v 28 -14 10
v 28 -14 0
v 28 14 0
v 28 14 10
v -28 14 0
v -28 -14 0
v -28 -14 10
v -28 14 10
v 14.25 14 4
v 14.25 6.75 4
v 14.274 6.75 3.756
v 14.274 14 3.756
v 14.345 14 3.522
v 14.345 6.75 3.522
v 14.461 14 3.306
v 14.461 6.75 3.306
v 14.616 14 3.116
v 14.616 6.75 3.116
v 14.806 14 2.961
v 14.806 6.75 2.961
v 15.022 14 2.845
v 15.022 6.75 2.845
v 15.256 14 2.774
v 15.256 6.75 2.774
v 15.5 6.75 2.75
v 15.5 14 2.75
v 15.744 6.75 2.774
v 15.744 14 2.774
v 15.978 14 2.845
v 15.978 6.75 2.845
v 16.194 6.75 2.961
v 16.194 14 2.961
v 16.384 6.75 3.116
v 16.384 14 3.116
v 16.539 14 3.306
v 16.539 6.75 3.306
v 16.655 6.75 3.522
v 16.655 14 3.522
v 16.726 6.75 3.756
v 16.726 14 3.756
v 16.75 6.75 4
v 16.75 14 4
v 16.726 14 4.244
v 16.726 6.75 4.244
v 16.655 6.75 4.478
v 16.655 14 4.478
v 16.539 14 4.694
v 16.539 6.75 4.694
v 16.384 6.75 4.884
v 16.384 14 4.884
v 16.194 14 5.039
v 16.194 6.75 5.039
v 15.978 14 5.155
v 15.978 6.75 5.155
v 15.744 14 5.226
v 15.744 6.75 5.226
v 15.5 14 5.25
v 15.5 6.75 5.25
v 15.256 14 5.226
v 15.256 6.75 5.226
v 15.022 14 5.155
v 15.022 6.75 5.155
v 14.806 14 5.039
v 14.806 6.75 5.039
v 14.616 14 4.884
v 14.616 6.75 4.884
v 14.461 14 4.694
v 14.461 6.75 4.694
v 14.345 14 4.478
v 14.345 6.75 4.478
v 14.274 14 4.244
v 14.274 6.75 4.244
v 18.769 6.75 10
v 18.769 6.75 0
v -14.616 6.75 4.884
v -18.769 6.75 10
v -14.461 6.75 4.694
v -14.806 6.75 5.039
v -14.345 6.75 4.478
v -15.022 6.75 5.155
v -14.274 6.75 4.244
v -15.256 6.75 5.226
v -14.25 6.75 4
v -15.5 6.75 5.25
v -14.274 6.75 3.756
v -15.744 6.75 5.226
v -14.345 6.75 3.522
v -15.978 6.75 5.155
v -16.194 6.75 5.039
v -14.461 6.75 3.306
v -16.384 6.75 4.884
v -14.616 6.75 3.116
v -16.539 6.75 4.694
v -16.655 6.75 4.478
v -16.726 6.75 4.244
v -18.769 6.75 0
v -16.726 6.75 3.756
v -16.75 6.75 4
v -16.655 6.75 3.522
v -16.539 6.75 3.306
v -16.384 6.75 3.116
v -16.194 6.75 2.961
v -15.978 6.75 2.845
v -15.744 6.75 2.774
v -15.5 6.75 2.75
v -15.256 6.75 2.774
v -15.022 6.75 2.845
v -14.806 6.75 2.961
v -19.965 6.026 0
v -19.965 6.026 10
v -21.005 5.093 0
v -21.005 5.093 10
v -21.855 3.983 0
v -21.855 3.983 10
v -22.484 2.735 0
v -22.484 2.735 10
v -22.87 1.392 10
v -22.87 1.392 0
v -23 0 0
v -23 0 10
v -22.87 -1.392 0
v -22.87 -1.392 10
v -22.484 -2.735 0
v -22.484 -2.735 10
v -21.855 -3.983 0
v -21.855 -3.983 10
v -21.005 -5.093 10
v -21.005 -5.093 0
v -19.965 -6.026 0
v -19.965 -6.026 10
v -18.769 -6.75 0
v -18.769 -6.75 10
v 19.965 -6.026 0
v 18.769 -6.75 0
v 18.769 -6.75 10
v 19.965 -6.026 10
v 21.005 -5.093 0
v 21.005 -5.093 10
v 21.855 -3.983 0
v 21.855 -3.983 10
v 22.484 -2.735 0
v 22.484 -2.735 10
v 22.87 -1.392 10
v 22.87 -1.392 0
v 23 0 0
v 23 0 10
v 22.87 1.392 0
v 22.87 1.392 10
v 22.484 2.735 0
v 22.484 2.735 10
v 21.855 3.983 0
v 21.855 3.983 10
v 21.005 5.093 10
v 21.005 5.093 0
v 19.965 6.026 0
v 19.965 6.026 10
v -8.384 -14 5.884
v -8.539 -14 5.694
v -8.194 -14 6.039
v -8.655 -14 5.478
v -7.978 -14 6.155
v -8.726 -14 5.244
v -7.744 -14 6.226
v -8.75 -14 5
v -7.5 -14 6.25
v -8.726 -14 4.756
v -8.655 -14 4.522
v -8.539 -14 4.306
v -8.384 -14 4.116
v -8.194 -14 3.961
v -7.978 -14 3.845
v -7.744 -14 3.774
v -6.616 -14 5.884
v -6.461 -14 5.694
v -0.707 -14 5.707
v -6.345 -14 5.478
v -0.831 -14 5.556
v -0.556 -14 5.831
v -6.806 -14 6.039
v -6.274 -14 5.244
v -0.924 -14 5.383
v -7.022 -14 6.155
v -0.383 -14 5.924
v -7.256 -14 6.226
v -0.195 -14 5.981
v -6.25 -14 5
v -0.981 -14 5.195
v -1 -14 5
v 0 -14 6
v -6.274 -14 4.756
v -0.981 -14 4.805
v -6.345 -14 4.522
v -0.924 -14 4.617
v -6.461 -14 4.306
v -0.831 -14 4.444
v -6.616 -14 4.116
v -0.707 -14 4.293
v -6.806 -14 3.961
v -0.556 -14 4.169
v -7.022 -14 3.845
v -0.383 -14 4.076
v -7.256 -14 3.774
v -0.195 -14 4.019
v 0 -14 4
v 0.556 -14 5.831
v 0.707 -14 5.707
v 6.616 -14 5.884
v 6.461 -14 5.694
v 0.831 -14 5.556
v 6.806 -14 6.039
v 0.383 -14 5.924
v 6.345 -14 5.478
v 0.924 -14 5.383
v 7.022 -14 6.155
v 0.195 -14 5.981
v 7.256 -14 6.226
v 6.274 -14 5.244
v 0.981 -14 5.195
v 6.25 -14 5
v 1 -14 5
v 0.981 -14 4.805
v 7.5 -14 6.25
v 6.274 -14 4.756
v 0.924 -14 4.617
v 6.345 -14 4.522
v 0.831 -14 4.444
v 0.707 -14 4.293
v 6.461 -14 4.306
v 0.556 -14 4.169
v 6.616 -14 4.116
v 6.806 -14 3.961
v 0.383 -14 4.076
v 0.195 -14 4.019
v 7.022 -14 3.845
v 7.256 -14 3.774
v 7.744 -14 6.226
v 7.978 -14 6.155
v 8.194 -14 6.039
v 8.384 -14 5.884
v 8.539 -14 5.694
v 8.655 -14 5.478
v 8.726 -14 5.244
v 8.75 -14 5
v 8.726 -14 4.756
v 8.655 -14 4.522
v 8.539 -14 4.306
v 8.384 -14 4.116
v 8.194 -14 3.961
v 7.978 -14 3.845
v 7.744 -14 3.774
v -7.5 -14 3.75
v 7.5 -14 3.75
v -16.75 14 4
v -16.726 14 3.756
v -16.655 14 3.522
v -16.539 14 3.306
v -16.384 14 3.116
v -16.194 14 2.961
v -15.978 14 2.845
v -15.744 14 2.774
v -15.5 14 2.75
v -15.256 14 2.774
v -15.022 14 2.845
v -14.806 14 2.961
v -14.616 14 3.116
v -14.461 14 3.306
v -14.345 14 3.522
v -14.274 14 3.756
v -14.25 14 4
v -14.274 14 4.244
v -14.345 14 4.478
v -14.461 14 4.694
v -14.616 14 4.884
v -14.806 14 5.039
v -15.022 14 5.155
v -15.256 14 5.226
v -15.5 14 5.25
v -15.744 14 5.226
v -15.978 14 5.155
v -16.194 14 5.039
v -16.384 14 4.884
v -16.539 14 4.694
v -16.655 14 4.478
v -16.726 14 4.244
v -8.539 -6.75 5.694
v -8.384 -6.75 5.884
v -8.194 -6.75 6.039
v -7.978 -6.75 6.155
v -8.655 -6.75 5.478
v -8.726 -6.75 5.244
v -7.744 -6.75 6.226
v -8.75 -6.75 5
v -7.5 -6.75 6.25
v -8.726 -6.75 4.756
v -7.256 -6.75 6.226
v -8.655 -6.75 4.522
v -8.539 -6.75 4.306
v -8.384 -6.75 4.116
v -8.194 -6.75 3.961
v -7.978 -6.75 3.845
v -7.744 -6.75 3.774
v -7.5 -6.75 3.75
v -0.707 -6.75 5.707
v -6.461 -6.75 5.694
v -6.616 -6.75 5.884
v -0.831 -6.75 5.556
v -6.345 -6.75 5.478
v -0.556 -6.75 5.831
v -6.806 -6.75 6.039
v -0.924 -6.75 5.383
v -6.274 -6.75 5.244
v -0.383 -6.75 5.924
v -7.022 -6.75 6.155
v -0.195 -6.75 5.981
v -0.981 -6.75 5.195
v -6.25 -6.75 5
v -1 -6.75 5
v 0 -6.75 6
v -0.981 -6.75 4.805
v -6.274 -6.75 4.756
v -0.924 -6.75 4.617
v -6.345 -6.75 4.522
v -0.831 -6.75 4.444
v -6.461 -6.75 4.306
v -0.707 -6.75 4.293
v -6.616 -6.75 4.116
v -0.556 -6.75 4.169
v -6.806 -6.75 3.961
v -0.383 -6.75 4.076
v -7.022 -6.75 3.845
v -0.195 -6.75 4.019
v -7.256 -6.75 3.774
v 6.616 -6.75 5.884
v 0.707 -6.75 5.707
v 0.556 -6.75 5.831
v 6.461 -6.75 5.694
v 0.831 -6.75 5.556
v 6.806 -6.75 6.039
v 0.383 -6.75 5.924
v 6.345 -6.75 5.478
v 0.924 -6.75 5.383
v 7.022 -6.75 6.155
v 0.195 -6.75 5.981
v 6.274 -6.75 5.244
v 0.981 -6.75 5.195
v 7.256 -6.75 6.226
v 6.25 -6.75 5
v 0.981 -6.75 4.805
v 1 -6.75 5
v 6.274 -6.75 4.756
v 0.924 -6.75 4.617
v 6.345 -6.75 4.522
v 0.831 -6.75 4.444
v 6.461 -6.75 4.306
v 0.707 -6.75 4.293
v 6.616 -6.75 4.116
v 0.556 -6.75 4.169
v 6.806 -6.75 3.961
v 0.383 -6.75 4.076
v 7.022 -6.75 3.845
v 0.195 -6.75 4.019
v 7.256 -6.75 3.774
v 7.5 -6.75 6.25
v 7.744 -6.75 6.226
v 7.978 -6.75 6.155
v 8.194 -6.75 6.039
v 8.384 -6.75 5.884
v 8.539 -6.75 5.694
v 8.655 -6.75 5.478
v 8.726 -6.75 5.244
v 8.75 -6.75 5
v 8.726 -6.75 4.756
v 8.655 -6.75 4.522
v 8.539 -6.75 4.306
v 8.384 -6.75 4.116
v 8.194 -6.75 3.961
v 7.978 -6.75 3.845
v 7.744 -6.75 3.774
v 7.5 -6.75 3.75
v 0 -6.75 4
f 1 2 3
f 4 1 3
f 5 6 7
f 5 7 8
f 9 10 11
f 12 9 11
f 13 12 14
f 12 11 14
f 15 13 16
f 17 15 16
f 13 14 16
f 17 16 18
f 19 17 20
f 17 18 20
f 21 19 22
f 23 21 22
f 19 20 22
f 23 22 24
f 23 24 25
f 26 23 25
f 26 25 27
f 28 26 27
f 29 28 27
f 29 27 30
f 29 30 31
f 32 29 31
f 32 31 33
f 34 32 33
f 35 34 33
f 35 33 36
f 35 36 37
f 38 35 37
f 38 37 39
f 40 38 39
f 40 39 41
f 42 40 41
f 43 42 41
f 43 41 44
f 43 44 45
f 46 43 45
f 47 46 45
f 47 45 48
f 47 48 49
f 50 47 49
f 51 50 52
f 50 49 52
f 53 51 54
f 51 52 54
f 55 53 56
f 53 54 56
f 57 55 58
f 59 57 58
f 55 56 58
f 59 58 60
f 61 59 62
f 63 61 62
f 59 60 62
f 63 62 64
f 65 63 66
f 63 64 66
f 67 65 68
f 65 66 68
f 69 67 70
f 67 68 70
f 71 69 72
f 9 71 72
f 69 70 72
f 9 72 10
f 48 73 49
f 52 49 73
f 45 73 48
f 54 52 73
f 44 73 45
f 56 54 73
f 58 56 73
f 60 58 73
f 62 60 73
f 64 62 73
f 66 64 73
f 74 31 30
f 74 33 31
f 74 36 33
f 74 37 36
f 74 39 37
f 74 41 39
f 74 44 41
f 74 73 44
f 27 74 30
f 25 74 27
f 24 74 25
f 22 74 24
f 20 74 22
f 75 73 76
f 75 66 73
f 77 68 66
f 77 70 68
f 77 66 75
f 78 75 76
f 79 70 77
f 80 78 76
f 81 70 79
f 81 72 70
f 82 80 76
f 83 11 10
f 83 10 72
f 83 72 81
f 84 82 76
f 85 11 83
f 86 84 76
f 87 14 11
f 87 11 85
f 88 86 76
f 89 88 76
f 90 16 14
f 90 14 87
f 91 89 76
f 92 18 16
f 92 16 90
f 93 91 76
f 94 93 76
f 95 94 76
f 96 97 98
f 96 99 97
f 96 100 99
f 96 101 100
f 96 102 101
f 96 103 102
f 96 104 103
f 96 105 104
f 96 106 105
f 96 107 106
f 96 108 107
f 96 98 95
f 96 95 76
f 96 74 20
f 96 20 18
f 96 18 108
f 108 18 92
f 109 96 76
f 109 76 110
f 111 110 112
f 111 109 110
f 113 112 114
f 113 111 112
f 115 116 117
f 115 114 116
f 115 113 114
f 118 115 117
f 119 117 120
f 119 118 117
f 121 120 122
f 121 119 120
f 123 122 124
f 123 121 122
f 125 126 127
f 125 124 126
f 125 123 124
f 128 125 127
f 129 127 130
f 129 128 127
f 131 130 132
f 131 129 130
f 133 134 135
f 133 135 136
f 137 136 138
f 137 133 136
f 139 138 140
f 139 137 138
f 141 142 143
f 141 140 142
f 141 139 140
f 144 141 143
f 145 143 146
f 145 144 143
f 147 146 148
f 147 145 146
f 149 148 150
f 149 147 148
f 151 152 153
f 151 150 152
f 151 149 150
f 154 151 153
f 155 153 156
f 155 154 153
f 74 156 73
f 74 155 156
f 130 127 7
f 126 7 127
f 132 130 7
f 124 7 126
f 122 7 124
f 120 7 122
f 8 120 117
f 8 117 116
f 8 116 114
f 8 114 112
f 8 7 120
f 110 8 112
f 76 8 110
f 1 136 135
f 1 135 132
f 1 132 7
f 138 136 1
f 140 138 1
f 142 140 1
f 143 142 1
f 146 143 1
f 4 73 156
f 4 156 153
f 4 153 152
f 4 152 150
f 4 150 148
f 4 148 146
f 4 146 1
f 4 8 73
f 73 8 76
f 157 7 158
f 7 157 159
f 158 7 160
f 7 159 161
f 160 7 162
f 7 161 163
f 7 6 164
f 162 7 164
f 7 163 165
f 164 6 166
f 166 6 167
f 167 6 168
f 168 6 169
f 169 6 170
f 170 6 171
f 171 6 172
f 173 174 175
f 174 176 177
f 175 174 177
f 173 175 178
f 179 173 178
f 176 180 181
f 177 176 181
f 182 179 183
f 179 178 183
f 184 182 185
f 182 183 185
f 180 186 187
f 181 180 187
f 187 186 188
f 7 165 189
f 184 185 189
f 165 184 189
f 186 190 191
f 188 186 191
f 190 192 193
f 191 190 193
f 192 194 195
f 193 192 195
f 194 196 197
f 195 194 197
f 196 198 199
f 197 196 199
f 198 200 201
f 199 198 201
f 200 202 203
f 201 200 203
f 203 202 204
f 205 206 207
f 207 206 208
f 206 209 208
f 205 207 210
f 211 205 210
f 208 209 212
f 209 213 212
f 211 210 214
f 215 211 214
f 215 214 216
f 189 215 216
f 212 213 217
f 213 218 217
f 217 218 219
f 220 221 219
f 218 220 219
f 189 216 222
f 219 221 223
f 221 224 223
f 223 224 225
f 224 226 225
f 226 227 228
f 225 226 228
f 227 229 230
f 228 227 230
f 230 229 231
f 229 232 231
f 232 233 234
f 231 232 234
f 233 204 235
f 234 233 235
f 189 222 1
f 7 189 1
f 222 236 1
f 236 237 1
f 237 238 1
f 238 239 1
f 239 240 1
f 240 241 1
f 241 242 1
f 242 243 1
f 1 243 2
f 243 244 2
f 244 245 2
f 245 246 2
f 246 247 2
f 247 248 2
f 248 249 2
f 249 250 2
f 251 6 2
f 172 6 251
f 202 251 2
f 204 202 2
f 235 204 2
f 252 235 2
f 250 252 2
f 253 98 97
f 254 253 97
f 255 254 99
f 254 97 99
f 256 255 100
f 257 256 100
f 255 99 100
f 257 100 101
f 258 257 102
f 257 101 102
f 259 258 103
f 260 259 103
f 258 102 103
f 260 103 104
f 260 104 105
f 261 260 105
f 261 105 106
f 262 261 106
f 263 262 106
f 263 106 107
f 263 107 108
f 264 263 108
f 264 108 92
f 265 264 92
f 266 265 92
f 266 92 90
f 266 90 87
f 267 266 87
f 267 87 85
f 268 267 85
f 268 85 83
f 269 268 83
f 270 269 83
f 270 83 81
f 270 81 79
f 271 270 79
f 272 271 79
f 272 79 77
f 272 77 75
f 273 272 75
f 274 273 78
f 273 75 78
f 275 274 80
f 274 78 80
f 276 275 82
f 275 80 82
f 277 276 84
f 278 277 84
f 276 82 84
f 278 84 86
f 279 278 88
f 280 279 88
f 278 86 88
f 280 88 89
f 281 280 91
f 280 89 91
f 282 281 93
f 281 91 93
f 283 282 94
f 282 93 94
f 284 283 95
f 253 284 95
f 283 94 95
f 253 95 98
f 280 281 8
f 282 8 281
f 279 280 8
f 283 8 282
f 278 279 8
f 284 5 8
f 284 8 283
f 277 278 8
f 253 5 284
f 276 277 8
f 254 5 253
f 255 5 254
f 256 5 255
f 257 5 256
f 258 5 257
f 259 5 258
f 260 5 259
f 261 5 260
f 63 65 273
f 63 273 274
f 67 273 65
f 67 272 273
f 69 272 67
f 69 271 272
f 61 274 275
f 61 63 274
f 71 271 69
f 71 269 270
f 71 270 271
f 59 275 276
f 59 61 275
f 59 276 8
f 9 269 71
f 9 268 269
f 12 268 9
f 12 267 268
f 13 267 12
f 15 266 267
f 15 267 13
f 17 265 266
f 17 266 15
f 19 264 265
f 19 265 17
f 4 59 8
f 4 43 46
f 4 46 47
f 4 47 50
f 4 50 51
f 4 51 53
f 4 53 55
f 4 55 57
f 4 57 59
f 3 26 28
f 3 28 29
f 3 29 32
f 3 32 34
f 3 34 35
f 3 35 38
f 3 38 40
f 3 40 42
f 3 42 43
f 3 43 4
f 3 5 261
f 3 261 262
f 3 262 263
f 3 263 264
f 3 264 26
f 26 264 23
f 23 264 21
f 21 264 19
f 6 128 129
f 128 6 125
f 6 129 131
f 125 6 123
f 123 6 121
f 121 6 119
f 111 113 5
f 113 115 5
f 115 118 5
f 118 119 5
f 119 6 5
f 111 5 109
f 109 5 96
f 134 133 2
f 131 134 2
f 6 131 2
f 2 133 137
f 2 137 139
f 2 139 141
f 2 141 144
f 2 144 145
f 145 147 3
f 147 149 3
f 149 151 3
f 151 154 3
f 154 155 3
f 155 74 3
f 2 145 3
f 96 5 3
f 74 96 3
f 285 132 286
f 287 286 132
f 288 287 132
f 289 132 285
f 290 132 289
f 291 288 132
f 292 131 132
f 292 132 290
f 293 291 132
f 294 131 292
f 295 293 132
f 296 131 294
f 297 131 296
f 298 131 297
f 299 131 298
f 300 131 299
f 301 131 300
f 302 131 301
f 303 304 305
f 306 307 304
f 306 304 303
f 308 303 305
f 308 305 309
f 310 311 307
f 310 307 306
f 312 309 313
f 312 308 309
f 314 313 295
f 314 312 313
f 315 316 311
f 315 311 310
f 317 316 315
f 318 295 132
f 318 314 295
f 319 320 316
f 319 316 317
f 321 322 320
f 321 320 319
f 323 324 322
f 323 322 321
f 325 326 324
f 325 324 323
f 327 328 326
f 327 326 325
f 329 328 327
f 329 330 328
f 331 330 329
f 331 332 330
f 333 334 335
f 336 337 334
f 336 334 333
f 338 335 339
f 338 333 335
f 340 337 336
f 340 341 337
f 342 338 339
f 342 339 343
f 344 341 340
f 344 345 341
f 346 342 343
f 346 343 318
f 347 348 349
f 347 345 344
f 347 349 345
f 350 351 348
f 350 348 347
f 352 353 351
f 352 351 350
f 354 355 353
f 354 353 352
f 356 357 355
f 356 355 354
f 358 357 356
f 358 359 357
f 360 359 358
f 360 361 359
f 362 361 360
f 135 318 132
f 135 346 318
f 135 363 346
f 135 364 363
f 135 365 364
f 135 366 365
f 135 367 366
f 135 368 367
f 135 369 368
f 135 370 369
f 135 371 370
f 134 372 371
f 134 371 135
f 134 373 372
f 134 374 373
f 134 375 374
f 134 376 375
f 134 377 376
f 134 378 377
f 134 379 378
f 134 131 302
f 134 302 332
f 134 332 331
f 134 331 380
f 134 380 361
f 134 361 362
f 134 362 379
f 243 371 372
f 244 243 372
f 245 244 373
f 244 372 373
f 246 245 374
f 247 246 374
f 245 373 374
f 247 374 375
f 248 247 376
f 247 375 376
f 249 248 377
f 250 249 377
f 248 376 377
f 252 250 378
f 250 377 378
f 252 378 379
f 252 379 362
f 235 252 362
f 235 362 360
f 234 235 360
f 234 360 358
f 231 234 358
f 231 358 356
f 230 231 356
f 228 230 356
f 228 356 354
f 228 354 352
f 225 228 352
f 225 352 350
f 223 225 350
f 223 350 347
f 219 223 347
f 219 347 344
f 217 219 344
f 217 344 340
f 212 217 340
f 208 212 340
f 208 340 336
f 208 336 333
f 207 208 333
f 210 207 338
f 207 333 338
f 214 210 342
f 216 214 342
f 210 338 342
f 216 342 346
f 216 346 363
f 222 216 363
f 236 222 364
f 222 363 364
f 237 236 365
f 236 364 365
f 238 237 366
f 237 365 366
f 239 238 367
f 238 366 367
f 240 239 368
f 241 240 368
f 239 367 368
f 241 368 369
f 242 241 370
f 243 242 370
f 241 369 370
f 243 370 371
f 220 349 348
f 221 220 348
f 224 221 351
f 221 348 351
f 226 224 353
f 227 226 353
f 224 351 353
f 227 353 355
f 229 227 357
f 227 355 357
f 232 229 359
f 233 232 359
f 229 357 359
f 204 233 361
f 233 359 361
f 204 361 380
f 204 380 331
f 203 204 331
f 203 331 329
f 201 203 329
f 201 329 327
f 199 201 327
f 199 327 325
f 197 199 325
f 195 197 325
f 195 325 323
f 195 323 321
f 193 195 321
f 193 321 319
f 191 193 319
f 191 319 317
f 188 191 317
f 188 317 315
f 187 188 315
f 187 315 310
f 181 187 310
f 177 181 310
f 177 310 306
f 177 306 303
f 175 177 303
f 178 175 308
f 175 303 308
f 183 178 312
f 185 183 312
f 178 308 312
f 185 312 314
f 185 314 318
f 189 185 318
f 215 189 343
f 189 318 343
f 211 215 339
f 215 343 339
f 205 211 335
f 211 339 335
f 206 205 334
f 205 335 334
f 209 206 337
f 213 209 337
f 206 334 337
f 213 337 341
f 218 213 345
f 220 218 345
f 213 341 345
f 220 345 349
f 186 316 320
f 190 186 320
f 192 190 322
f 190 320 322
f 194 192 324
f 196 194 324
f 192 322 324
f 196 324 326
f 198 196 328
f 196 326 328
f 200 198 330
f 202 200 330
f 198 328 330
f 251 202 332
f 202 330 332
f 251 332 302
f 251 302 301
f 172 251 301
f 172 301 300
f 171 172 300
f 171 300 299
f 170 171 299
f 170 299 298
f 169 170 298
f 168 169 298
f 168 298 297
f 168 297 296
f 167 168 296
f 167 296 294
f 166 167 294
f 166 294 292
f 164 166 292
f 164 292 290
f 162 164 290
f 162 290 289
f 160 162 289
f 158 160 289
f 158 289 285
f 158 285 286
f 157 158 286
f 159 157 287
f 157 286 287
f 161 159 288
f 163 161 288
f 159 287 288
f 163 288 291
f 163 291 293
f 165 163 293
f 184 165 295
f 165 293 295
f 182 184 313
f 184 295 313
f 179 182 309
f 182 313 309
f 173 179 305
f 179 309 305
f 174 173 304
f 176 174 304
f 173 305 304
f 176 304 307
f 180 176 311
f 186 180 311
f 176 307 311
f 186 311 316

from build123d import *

# Parameters (mm, degrees)
SKIZZE1_W                       = 56
SKIZZE1_H                       = 28
AUFSATZ_LINEAR_AUSTRAGEN1_DEPTH = 10
SCHNITT_LINEAR_AUSTRAGEN1_DEPTH = 33.86335345
KERNLOCH_F_R_M3_GEWINDE1_D      = 2.5
KERNLOCH_F_R_M3_GEWINDE1_DEPTH  = 8.5
KERNLOCH_F_R_M3_GEWINDE1_TIP    = 0.751075774
KERNLOCH_F_R_M3_GEWINDE2_D      = 2.5
KERNLOCH_F_R_M3_GEWINDE2_DEPTH  = 7.25
F_2_0MM_STIFTLOCH1_D            = 2
F_2_0MM_STIFTLOCH1_DEPTH        = 8.5
F_2_0MM_STIFTLOCH1_TIP          = 0.600860619


with BuildPart() as part:
    # Skizze1 → Aufsatz-Linear austragen1 (new body)
    with BuildSketch(Plane.XY):
        Rectangle(SKIZZE1_W, SKIZZE1_H)
    extrude(amount=AUFSATZ_LINEAR_AUSTRAGEN1_DEPTH)

    # Skizze2 → Schnitt-Linear austragen1 (cut, through all)
    with BuildSketch(Plane(origin=(0, 0, 0), x_dir=(-1, 0, 0), z_dir=(0, 0, -1))):
        with BuildLine():
            Line((-18.769174208, 6.75), (18.769174208, 6.75))
            ThreePointArc((18.769174208, 6.75), (23, 0), (18.769174208, -6.75))
            Line((18.769174208, -6.75), (-18.769174208, -6.75))
            ThreePointArc((-18.769174208, -6.75), (-23, 0), (-18.769174208, 6.75))
        make_face()
    extrude(amount=-SCHNITT_LINEAR_AUSTRAGEN1_DEPTH, mode=Mode.SUBTRACT)

    # Kernloch für M3 Gewinde1
    with Locations(Plane(origin=(0, -14, 0), x_dir=(-1, 0, 0), z_dir=(0, -1, 0))):
        with Locations((-7.5, -5), (7.5, -5)):
            Hole(KERNLOCH_F_R_M3_GEWINDE1_D / 2, depth=KERNLOCH_F_R_M3_GEWINDE1_DEPTH)
            with Locations((0, 0, -(KERNLOCH_F_R_M3_GEWINDE1_DEPTH + KERNLOCH_F_R_M3_GEWINDE1_TIP / 2))):  # 118° drill point
                Cone(0, KERNLOCH_F_R_M3_GEWINDE1_D / 2, KERNLOCH_F_R_M3_GEWINDE1_TIP, mode=Mode.SUBTRACT)

    # Kernloch für M3 Gewinde2
    with Locations(Plane(origin=(0, 14, 0), x_dir=(1, 0, 0), z_dir=(0, 1, 0))):
        with Locations((15.5, -4), (-15.5, -4)):
            Hole(KERNLOCH_F_R_M3_GEWINDE2_D / 2, depth=KERNLOCH_F_R_M3_GEWINDE2_DEPTH)

    # Ø2.0mm Stiftloch1
    with Locations(Plane(origin=(0, -14, 0), x_dir=(-1, 0, 0), z_dir=(0, -1, 0))):
        with Locations((0, -5)):
            Hole(F_2_0MM_STIFTLOCH1_D / 2, depth=F_2_0MM_STIFTLOCH1_DEPTH)
            with Locations((0, 0, -(F_2_0MM_STIFTLOCH1_DEPTH + F_2_0MM_STIFTLOCH1_TIP / 2))):  # 118° drill point
                Cone(0, F_2_0MM_STIFTLOCH1_D / 2, F_2_0MM_STIFTLOCH1_TIP, mode=Mode.SUBTRACT)


solid = part.part
